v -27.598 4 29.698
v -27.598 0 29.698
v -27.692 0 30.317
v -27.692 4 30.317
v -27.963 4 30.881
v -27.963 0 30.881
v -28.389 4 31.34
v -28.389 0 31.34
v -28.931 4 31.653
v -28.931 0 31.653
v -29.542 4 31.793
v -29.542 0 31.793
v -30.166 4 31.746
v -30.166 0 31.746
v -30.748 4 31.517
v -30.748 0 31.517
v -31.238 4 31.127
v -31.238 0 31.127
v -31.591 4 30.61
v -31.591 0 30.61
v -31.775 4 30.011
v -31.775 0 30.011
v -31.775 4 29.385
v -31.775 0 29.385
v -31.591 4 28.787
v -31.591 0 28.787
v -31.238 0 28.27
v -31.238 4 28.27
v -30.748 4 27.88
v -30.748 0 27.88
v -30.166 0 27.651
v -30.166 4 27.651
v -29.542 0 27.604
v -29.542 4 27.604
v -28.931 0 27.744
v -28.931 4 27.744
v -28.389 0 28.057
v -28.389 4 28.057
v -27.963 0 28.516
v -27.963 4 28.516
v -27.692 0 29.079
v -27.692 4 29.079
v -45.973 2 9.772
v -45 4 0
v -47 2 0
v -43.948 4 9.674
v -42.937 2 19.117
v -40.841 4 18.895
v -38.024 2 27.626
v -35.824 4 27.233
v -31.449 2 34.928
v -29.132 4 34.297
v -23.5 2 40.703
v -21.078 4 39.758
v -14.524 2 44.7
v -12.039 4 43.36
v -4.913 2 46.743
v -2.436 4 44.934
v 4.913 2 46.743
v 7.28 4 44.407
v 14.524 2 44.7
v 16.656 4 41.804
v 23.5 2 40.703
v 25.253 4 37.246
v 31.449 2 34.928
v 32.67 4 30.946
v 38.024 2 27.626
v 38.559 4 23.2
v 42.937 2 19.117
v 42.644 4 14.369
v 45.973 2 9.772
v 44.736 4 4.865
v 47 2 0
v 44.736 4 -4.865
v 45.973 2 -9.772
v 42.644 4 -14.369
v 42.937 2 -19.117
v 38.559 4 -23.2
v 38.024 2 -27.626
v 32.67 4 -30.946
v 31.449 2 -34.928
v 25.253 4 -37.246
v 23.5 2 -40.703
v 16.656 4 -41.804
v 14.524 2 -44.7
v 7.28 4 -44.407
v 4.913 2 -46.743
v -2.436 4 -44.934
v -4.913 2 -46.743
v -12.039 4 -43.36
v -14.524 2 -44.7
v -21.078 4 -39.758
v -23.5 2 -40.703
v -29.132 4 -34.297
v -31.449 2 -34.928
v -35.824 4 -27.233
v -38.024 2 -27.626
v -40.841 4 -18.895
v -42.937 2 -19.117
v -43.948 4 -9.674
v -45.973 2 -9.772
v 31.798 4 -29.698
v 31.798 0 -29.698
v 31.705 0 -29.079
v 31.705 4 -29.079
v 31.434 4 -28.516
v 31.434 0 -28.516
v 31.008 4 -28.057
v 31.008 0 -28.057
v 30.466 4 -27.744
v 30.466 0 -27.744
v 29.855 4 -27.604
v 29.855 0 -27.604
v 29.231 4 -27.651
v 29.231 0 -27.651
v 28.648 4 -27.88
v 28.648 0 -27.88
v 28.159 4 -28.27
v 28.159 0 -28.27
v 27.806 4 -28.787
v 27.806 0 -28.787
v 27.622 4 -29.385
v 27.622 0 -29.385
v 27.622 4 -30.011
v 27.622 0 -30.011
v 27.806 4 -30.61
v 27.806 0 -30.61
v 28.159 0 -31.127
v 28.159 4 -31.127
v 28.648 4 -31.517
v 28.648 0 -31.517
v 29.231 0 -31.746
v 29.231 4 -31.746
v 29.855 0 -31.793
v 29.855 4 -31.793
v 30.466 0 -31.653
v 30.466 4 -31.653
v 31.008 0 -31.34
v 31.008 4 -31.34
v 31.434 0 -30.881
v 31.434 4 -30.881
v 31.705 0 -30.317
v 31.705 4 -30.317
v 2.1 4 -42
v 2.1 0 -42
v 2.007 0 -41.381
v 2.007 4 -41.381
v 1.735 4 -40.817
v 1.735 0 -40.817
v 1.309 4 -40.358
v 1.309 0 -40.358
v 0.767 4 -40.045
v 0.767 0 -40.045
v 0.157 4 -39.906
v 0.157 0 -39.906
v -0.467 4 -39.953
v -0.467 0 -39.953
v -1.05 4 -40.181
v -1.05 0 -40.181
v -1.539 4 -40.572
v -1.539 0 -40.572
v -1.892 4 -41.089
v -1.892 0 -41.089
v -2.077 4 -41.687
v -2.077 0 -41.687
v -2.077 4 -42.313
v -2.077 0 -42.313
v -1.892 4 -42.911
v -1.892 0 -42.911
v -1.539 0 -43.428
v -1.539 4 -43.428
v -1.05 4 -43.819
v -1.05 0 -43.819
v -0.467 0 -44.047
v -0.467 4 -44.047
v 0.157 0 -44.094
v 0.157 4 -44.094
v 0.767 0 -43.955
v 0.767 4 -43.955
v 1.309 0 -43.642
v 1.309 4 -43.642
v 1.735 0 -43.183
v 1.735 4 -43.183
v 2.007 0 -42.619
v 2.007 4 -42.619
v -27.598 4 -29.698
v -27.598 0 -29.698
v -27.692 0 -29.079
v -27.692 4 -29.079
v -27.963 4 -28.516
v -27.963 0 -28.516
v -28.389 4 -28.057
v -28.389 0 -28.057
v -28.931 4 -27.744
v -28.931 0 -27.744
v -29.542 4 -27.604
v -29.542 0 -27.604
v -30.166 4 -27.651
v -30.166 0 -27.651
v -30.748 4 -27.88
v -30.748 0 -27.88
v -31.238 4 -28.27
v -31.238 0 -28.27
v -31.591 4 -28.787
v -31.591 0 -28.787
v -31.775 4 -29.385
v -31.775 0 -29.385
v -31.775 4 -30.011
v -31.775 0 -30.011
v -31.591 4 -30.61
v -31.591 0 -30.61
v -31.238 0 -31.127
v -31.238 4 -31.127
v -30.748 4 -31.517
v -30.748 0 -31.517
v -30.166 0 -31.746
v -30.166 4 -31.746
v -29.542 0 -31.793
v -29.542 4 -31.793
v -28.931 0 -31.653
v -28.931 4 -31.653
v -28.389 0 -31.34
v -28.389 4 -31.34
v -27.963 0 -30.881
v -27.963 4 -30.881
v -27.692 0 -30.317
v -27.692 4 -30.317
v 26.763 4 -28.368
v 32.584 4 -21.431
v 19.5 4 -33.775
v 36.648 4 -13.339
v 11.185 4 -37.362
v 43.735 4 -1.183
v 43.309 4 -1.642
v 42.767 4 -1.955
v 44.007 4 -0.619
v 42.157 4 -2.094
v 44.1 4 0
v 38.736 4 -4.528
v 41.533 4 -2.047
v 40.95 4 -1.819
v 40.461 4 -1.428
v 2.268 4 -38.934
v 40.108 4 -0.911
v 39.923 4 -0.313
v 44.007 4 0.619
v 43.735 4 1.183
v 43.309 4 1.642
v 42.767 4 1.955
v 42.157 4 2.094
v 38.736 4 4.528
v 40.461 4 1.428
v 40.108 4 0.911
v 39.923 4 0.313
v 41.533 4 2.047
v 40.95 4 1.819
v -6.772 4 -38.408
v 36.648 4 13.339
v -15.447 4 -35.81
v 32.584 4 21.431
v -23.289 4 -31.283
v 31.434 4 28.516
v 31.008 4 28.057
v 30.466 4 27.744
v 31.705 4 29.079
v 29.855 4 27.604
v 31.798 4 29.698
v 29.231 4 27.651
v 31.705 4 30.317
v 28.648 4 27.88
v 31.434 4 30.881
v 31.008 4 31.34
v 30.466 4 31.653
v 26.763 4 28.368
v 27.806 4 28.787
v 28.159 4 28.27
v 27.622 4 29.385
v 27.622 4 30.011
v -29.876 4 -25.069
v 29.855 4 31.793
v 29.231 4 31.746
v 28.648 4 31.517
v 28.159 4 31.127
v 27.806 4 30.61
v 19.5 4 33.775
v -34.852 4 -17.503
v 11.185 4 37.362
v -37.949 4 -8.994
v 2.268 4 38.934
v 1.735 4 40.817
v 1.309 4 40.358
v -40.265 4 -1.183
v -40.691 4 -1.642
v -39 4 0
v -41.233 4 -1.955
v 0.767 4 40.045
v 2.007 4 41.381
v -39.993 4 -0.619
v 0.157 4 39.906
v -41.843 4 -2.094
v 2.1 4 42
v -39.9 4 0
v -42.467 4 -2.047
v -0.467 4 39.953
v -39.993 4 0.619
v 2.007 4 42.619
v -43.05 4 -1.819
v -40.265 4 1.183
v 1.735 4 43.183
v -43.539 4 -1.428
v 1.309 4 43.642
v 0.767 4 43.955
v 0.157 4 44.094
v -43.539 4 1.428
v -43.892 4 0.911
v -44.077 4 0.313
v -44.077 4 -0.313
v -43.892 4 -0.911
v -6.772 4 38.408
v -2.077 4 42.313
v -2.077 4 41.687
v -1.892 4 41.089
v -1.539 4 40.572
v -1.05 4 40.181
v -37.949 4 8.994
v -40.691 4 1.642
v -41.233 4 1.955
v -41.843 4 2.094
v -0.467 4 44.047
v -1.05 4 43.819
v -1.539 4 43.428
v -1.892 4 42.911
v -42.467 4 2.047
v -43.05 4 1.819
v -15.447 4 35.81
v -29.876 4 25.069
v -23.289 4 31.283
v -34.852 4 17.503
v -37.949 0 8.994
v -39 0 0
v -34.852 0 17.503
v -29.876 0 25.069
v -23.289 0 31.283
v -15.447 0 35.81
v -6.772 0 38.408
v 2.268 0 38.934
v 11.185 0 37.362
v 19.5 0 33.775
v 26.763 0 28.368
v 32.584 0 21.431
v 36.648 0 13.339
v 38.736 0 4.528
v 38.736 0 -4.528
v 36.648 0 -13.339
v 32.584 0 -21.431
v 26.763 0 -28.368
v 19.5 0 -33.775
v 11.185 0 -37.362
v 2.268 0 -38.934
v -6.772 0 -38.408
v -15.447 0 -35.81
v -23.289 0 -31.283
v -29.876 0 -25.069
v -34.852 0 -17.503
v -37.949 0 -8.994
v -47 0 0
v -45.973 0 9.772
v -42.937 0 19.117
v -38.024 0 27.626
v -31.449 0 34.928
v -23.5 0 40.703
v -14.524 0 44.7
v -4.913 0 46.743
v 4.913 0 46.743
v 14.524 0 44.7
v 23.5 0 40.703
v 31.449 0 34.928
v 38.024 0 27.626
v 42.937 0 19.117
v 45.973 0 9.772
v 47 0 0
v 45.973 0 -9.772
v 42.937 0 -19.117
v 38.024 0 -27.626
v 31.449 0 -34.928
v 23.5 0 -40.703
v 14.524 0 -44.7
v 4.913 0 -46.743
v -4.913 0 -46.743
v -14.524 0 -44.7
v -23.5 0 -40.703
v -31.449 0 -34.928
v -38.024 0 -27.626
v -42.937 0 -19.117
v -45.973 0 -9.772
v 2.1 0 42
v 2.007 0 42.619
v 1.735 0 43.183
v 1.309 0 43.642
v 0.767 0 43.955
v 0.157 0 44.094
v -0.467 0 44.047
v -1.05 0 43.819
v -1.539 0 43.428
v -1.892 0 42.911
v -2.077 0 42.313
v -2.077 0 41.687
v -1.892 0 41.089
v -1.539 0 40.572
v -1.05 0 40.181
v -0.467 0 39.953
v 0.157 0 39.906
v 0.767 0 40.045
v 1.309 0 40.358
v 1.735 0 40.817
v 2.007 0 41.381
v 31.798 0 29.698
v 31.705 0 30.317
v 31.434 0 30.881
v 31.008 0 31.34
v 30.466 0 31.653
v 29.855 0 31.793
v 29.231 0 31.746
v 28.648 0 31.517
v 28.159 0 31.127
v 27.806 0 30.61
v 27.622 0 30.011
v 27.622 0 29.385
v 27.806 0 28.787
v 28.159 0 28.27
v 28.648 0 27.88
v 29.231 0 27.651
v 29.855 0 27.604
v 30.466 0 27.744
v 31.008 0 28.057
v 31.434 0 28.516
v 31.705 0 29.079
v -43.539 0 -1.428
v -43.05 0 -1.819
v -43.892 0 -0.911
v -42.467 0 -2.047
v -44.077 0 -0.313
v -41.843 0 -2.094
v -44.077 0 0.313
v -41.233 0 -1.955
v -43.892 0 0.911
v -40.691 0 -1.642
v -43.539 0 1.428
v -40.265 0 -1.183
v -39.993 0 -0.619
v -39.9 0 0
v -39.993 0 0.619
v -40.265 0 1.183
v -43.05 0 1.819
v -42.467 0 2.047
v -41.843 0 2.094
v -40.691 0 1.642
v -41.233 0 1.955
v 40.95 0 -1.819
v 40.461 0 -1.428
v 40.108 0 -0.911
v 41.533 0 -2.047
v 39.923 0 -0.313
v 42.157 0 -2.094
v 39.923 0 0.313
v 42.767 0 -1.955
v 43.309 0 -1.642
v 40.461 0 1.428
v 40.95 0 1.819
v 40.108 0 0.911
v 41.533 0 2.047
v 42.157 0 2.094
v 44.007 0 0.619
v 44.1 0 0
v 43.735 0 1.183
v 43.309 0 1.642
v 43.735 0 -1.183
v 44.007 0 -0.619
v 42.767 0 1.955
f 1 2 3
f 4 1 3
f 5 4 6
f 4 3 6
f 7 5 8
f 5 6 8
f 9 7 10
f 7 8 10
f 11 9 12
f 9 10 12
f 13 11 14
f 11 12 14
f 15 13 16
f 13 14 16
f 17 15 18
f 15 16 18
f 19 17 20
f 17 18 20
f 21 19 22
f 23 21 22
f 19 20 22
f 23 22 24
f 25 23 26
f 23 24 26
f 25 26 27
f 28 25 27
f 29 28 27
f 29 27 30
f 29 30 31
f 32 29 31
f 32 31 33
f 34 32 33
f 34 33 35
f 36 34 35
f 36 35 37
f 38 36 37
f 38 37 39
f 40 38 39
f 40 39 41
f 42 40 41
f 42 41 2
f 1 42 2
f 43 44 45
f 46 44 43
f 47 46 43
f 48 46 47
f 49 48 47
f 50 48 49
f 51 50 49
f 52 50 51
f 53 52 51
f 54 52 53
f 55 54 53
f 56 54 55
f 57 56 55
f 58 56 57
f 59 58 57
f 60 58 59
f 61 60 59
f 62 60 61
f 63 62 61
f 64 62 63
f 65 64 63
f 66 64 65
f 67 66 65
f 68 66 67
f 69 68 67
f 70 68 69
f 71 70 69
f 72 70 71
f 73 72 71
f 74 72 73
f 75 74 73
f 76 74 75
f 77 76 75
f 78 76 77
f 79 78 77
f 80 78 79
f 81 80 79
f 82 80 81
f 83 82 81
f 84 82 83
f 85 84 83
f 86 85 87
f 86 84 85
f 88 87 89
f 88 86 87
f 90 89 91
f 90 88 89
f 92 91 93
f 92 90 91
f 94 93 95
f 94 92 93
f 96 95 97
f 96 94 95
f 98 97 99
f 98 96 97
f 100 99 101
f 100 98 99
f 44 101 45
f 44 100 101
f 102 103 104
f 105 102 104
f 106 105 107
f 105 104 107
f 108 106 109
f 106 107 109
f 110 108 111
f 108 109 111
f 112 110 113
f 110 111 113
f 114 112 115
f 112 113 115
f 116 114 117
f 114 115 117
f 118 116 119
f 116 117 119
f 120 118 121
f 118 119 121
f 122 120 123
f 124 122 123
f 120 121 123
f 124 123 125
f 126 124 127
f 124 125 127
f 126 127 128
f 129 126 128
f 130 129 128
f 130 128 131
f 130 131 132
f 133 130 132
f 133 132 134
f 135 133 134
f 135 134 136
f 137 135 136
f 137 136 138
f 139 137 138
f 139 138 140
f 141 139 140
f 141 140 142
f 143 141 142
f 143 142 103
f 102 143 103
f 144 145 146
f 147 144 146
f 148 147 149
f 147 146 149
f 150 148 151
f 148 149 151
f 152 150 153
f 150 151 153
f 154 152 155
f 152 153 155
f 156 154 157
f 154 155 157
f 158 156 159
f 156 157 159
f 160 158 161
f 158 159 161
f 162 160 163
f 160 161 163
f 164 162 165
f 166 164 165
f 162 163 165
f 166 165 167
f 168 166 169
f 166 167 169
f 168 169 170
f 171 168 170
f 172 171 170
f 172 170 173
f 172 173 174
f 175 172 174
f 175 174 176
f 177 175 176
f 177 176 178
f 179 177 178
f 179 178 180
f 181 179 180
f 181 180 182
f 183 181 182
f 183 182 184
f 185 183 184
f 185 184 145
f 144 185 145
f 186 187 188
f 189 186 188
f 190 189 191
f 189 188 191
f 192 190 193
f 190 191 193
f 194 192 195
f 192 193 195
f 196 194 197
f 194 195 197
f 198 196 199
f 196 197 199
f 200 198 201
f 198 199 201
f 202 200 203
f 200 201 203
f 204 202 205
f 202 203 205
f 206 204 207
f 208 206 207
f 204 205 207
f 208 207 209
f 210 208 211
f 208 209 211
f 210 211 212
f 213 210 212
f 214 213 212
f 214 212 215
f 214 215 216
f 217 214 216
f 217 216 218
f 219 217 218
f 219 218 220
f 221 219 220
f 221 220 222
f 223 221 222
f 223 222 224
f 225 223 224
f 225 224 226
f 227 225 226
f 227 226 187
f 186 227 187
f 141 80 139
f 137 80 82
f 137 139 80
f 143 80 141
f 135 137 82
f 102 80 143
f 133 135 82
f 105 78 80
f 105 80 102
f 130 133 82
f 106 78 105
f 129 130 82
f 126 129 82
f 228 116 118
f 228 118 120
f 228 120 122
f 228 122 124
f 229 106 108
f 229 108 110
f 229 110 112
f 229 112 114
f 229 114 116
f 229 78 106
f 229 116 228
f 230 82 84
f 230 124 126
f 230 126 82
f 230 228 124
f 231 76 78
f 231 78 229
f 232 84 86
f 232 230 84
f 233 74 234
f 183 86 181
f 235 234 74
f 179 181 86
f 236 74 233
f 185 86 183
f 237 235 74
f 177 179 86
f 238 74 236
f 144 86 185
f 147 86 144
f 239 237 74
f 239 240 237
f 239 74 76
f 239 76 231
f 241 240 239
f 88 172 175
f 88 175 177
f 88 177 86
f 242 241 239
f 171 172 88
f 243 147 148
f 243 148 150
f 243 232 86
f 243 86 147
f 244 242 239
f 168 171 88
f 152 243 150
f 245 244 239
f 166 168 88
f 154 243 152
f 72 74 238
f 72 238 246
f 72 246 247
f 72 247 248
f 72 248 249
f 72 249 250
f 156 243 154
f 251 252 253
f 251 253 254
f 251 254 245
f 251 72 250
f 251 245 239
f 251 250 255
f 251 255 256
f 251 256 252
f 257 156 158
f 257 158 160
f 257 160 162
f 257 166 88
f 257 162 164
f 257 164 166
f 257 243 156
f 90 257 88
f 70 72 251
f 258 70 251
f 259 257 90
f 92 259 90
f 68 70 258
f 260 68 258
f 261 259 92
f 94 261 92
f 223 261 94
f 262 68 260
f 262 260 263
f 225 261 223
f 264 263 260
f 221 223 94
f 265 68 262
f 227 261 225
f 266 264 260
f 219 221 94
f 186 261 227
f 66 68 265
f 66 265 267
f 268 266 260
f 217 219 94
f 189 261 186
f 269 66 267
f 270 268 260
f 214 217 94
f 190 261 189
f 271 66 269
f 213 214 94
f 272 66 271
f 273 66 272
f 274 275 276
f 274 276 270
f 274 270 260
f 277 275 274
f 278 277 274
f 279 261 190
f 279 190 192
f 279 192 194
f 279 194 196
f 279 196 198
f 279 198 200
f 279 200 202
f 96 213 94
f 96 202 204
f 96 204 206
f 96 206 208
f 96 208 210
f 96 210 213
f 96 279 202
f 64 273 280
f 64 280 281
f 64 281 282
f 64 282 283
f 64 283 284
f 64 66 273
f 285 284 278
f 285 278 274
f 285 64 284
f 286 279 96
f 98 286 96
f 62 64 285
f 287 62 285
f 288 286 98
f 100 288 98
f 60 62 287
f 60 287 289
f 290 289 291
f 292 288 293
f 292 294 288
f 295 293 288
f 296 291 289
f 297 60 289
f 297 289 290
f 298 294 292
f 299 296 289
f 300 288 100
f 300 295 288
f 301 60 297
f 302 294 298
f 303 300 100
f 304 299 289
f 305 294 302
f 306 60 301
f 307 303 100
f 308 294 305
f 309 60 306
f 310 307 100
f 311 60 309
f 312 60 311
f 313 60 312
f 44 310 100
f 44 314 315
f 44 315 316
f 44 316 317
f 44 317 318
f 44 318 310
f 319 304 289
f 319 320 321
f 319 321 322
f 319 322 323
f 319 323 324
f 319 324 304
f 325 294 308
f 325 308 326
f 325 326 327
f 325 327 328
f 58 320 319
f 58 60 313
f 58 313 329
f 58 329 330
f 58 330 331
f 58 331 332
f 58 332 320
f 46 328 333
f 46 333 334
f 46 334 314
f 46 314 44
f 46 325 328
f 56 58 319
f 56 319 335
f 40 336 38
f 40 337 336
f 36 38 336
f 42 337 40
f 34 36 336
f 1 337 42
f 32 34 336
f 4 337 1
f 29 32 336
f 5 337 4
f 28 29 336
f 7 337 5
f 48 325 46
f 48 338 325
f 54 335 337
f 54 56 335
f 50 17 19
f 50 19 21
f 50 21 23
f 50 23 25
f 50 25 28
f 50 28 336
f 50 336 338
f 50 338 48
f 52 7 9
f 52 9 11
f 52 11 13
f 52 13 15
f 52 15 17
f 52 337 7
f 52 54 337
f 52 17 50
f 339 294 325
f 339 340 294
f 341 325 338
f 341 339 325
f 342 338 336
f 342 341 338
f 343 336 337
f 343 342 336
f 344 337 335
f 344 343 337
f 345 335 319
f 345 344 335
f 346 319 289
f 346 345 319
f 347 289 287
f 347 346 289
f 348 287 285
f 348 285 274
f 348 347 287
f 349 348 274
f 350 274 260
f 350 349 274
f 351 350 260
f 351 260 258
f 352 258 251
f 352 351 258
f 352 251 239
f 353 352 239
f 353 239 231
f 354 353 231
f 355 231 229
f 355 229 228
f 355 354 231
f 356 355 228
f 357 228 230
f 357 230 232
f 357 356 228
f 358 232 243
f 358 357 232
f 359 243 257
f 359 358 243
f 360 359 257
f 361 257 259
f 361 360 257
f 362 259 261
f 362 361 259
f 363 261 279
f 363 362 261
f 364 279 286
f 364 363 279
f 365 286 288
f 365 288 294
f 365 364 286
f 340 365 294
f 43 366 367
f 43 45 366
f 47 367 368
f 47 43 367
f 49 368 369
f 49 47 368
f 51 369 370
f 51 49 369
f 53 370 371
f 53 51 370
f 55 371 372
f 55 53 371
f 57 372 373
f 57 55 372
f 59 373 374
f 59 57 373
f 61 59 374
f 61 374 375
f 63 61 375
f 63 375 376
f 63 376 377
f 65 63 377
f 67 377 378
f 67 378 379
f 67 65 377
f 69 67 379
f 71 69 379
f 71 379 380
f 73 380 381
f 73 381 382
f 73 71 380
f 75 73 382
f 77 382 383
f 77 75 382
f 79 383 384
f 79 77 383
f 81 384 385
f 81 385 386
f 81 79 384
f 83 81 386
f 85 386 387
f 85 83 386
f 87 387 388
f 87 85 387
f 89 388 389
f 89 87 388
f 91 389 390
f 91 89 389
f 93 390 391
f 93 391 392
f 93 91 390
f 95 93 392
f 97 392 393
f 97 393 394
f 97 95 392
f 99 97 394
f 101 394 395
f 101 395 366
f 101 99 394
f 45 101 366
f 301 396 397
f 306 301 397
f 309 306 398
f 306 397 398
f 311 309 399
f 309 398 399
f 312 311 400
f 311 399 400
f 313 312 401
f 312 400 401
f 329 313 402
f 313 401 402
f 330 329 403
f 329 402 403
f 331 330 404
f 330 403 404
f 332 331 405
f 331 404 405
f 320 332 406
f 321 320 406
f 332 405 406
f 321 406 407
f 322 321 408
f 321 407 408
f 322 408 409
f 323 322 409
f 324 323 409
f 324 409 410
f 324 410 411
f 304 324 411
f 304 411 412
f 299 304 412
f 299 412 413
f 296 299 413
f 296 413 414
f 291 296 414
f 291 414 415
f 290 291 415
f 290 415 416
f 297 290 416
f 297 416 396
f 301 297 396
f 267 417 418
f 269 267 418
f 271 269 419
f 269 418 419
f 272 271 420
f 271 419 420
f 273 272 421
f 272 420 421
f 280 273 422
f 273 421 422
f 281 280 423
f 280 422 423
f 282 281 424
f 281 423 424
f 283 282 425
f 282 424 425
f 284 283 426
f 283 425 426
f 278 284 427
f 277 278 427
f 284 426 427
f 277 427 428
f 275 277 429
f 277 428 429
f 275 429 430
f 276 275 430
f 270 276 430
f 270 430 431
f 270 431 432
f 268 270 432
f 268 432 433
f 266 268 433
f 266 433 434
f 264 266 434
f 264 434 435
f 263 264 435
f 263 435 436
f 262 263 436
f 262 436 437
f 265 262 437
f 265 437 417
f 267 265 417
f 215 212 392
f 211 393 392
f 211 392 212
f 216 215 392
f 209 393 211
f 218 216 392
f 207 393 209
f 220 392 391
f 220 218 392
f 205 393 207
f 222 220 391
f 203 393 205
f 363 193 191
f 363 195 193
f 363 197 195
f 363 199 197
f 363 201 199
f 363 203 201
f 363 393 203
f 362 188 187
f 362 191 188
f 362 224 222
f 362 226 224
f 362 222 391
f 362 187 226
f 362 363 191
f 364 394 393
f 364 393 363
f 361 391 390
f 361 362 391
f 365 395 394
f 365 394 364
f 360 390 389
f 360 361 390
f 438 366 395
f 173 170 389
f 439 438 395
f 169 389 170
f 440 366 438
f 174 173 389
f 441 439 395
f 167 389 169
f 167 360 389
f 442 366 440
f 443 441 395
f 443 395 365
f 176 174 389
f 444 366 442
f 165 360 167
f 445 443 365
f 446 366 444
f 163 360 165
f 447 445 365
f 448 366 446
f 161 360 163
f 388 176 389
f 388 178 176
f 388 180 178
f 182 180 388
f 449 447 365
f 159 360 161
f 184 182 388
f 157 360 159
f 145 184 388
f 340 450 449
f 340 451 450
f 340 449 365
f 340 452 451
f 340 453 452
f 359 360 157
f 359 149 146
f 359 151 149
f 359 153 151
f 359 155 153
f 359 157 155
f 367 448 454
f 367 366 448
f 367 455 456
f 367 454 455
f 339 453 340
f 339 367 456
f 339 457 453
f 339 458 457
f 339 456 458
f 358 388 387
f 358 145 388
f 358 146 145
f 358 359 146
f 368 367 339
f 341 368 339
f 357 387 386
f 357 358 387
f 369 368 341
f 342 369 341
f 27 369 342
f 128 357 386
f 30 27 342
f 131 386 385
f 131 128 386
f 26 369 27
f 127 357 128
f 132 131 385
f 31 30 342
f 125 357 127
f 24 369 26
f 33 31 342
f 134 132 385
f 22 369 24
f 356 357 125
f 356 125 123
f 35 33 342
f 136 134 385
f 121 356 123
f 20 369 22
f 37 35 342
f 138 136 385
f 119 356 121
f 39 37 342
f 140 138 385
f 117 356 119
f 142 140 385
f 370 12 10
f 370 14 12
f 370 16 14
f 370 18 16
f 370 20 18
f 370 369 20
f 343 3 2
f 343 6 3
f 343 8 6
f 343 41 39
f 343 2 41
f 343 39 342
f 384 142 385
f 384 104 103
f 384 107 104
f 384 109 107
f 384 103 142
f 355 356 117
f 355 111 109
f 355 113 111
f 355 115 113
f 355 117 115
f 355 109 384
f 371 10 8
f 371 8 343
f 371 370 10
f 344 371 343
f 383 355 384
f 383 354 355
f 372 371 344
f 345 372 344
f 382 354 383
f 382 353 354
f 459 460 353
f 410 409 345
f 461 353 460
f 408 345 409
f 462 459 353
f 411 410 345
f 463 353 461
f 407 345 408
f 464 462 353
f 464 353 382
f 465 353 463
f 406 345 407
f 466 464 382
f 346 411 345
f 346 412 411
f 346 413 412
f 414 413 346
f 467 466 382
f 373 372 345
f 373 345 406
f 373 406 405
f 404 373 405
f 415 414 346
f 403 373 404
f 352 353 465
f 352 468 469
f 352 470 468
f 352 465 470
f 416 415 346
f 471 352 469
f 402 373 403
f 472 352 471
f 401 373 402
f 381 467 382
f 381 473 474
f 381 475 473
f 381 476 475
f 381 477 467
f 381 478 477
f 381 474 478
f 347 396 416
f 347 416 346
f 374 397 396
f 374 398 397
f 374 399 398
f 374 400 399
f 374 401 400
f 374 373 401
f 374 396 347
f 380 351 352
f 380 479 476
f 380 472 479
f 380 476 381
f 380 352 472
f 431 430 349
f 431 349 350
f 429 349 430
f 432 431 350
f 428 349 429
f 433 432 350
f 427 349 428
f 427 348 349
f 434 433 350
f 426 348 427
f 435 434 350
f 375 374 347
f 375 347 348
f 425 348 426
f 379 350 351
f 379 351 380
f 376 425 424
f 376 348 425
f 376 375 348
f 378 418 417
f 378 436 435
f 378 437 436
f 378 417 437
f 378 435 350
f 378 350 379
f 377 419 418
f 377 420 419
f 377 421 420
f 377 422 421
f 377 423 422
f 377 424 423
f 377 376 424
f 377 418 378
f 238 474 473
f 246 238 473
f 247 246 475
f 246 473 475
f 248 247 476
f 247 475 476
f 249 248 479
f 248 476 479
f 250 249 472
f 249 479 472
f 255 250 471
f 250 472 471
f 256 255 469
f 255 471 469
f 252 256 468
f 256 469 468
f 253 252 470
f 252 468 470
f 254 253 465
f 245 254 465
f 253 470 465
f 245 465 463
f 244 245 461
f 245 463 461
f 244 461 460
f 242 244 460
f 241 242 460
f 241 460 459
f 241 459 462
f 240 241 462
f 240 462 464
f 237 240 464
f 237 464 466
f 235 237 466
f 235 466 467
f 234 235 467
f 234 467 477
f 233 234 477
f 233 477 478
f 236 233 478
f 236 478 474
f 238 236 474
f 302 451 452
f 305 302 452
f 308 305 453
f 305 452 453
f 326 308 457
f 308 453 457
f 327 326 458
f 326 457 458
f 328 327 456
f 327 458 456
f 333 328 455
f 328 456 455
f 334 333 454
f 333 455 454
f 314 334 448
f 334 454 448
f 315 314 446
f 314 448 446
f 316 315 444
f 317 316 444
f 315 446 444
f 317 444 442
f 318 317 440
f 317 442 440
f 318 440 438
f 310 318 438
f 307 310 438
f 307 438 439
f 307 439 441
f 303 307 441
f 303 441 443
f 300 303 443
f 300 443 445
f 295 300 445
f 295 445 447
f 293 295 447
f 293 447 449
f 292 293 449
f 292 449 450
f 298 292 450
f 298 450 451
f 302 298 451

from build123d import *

# Parameters (mm, degrees)
SKETCH_2_R          = 2.1
CUT_EXTRUDE_1_DEPTH = 10


with BuildPart() as part:
    # 草图1 → 旋转1 (revolve)
    with BuildSketch(Plane.XY):
        Polygon((-39, 0), (-47, 0), (-47, 2), (-45, 4), (-39, 4), align=None)
    revolve(axis=Axis((0, 0, 0), (0, 1, 0)))

    # 草图2 → 切除-拉伸1 (cut)
    with BuildSketch(Plane.XZ):
        with Locations((0, 42)):
            Circle(SKETCH_2_R)
        with Locations((29.69848481, 29.69848481)):
            Circle(SKETCH_2_R)
        with Locations((42, 0)):
            Circle(SKETCH_2_R)
        with Locations((29.69848481, -29.69848481)):
            Circle(SKETCH_2_R)
        with Locations((0, -42)):
            Circle(SKETCH_2_R)
        with Locations((-29.69848481, -29.69848481)):
            Circle(SKETCH_2_R)
        with Locations((-42, 0)):
            Circle(SKETCH_2_R)
        with Locations((-29.69848481, 29.69848481)):
            Circle(SKETCH_2_R)
    extrude(amount=-CUT_EXTRUDE_1_DEPTH, mode=Mode.SUBTRACT)


solid = part.part
